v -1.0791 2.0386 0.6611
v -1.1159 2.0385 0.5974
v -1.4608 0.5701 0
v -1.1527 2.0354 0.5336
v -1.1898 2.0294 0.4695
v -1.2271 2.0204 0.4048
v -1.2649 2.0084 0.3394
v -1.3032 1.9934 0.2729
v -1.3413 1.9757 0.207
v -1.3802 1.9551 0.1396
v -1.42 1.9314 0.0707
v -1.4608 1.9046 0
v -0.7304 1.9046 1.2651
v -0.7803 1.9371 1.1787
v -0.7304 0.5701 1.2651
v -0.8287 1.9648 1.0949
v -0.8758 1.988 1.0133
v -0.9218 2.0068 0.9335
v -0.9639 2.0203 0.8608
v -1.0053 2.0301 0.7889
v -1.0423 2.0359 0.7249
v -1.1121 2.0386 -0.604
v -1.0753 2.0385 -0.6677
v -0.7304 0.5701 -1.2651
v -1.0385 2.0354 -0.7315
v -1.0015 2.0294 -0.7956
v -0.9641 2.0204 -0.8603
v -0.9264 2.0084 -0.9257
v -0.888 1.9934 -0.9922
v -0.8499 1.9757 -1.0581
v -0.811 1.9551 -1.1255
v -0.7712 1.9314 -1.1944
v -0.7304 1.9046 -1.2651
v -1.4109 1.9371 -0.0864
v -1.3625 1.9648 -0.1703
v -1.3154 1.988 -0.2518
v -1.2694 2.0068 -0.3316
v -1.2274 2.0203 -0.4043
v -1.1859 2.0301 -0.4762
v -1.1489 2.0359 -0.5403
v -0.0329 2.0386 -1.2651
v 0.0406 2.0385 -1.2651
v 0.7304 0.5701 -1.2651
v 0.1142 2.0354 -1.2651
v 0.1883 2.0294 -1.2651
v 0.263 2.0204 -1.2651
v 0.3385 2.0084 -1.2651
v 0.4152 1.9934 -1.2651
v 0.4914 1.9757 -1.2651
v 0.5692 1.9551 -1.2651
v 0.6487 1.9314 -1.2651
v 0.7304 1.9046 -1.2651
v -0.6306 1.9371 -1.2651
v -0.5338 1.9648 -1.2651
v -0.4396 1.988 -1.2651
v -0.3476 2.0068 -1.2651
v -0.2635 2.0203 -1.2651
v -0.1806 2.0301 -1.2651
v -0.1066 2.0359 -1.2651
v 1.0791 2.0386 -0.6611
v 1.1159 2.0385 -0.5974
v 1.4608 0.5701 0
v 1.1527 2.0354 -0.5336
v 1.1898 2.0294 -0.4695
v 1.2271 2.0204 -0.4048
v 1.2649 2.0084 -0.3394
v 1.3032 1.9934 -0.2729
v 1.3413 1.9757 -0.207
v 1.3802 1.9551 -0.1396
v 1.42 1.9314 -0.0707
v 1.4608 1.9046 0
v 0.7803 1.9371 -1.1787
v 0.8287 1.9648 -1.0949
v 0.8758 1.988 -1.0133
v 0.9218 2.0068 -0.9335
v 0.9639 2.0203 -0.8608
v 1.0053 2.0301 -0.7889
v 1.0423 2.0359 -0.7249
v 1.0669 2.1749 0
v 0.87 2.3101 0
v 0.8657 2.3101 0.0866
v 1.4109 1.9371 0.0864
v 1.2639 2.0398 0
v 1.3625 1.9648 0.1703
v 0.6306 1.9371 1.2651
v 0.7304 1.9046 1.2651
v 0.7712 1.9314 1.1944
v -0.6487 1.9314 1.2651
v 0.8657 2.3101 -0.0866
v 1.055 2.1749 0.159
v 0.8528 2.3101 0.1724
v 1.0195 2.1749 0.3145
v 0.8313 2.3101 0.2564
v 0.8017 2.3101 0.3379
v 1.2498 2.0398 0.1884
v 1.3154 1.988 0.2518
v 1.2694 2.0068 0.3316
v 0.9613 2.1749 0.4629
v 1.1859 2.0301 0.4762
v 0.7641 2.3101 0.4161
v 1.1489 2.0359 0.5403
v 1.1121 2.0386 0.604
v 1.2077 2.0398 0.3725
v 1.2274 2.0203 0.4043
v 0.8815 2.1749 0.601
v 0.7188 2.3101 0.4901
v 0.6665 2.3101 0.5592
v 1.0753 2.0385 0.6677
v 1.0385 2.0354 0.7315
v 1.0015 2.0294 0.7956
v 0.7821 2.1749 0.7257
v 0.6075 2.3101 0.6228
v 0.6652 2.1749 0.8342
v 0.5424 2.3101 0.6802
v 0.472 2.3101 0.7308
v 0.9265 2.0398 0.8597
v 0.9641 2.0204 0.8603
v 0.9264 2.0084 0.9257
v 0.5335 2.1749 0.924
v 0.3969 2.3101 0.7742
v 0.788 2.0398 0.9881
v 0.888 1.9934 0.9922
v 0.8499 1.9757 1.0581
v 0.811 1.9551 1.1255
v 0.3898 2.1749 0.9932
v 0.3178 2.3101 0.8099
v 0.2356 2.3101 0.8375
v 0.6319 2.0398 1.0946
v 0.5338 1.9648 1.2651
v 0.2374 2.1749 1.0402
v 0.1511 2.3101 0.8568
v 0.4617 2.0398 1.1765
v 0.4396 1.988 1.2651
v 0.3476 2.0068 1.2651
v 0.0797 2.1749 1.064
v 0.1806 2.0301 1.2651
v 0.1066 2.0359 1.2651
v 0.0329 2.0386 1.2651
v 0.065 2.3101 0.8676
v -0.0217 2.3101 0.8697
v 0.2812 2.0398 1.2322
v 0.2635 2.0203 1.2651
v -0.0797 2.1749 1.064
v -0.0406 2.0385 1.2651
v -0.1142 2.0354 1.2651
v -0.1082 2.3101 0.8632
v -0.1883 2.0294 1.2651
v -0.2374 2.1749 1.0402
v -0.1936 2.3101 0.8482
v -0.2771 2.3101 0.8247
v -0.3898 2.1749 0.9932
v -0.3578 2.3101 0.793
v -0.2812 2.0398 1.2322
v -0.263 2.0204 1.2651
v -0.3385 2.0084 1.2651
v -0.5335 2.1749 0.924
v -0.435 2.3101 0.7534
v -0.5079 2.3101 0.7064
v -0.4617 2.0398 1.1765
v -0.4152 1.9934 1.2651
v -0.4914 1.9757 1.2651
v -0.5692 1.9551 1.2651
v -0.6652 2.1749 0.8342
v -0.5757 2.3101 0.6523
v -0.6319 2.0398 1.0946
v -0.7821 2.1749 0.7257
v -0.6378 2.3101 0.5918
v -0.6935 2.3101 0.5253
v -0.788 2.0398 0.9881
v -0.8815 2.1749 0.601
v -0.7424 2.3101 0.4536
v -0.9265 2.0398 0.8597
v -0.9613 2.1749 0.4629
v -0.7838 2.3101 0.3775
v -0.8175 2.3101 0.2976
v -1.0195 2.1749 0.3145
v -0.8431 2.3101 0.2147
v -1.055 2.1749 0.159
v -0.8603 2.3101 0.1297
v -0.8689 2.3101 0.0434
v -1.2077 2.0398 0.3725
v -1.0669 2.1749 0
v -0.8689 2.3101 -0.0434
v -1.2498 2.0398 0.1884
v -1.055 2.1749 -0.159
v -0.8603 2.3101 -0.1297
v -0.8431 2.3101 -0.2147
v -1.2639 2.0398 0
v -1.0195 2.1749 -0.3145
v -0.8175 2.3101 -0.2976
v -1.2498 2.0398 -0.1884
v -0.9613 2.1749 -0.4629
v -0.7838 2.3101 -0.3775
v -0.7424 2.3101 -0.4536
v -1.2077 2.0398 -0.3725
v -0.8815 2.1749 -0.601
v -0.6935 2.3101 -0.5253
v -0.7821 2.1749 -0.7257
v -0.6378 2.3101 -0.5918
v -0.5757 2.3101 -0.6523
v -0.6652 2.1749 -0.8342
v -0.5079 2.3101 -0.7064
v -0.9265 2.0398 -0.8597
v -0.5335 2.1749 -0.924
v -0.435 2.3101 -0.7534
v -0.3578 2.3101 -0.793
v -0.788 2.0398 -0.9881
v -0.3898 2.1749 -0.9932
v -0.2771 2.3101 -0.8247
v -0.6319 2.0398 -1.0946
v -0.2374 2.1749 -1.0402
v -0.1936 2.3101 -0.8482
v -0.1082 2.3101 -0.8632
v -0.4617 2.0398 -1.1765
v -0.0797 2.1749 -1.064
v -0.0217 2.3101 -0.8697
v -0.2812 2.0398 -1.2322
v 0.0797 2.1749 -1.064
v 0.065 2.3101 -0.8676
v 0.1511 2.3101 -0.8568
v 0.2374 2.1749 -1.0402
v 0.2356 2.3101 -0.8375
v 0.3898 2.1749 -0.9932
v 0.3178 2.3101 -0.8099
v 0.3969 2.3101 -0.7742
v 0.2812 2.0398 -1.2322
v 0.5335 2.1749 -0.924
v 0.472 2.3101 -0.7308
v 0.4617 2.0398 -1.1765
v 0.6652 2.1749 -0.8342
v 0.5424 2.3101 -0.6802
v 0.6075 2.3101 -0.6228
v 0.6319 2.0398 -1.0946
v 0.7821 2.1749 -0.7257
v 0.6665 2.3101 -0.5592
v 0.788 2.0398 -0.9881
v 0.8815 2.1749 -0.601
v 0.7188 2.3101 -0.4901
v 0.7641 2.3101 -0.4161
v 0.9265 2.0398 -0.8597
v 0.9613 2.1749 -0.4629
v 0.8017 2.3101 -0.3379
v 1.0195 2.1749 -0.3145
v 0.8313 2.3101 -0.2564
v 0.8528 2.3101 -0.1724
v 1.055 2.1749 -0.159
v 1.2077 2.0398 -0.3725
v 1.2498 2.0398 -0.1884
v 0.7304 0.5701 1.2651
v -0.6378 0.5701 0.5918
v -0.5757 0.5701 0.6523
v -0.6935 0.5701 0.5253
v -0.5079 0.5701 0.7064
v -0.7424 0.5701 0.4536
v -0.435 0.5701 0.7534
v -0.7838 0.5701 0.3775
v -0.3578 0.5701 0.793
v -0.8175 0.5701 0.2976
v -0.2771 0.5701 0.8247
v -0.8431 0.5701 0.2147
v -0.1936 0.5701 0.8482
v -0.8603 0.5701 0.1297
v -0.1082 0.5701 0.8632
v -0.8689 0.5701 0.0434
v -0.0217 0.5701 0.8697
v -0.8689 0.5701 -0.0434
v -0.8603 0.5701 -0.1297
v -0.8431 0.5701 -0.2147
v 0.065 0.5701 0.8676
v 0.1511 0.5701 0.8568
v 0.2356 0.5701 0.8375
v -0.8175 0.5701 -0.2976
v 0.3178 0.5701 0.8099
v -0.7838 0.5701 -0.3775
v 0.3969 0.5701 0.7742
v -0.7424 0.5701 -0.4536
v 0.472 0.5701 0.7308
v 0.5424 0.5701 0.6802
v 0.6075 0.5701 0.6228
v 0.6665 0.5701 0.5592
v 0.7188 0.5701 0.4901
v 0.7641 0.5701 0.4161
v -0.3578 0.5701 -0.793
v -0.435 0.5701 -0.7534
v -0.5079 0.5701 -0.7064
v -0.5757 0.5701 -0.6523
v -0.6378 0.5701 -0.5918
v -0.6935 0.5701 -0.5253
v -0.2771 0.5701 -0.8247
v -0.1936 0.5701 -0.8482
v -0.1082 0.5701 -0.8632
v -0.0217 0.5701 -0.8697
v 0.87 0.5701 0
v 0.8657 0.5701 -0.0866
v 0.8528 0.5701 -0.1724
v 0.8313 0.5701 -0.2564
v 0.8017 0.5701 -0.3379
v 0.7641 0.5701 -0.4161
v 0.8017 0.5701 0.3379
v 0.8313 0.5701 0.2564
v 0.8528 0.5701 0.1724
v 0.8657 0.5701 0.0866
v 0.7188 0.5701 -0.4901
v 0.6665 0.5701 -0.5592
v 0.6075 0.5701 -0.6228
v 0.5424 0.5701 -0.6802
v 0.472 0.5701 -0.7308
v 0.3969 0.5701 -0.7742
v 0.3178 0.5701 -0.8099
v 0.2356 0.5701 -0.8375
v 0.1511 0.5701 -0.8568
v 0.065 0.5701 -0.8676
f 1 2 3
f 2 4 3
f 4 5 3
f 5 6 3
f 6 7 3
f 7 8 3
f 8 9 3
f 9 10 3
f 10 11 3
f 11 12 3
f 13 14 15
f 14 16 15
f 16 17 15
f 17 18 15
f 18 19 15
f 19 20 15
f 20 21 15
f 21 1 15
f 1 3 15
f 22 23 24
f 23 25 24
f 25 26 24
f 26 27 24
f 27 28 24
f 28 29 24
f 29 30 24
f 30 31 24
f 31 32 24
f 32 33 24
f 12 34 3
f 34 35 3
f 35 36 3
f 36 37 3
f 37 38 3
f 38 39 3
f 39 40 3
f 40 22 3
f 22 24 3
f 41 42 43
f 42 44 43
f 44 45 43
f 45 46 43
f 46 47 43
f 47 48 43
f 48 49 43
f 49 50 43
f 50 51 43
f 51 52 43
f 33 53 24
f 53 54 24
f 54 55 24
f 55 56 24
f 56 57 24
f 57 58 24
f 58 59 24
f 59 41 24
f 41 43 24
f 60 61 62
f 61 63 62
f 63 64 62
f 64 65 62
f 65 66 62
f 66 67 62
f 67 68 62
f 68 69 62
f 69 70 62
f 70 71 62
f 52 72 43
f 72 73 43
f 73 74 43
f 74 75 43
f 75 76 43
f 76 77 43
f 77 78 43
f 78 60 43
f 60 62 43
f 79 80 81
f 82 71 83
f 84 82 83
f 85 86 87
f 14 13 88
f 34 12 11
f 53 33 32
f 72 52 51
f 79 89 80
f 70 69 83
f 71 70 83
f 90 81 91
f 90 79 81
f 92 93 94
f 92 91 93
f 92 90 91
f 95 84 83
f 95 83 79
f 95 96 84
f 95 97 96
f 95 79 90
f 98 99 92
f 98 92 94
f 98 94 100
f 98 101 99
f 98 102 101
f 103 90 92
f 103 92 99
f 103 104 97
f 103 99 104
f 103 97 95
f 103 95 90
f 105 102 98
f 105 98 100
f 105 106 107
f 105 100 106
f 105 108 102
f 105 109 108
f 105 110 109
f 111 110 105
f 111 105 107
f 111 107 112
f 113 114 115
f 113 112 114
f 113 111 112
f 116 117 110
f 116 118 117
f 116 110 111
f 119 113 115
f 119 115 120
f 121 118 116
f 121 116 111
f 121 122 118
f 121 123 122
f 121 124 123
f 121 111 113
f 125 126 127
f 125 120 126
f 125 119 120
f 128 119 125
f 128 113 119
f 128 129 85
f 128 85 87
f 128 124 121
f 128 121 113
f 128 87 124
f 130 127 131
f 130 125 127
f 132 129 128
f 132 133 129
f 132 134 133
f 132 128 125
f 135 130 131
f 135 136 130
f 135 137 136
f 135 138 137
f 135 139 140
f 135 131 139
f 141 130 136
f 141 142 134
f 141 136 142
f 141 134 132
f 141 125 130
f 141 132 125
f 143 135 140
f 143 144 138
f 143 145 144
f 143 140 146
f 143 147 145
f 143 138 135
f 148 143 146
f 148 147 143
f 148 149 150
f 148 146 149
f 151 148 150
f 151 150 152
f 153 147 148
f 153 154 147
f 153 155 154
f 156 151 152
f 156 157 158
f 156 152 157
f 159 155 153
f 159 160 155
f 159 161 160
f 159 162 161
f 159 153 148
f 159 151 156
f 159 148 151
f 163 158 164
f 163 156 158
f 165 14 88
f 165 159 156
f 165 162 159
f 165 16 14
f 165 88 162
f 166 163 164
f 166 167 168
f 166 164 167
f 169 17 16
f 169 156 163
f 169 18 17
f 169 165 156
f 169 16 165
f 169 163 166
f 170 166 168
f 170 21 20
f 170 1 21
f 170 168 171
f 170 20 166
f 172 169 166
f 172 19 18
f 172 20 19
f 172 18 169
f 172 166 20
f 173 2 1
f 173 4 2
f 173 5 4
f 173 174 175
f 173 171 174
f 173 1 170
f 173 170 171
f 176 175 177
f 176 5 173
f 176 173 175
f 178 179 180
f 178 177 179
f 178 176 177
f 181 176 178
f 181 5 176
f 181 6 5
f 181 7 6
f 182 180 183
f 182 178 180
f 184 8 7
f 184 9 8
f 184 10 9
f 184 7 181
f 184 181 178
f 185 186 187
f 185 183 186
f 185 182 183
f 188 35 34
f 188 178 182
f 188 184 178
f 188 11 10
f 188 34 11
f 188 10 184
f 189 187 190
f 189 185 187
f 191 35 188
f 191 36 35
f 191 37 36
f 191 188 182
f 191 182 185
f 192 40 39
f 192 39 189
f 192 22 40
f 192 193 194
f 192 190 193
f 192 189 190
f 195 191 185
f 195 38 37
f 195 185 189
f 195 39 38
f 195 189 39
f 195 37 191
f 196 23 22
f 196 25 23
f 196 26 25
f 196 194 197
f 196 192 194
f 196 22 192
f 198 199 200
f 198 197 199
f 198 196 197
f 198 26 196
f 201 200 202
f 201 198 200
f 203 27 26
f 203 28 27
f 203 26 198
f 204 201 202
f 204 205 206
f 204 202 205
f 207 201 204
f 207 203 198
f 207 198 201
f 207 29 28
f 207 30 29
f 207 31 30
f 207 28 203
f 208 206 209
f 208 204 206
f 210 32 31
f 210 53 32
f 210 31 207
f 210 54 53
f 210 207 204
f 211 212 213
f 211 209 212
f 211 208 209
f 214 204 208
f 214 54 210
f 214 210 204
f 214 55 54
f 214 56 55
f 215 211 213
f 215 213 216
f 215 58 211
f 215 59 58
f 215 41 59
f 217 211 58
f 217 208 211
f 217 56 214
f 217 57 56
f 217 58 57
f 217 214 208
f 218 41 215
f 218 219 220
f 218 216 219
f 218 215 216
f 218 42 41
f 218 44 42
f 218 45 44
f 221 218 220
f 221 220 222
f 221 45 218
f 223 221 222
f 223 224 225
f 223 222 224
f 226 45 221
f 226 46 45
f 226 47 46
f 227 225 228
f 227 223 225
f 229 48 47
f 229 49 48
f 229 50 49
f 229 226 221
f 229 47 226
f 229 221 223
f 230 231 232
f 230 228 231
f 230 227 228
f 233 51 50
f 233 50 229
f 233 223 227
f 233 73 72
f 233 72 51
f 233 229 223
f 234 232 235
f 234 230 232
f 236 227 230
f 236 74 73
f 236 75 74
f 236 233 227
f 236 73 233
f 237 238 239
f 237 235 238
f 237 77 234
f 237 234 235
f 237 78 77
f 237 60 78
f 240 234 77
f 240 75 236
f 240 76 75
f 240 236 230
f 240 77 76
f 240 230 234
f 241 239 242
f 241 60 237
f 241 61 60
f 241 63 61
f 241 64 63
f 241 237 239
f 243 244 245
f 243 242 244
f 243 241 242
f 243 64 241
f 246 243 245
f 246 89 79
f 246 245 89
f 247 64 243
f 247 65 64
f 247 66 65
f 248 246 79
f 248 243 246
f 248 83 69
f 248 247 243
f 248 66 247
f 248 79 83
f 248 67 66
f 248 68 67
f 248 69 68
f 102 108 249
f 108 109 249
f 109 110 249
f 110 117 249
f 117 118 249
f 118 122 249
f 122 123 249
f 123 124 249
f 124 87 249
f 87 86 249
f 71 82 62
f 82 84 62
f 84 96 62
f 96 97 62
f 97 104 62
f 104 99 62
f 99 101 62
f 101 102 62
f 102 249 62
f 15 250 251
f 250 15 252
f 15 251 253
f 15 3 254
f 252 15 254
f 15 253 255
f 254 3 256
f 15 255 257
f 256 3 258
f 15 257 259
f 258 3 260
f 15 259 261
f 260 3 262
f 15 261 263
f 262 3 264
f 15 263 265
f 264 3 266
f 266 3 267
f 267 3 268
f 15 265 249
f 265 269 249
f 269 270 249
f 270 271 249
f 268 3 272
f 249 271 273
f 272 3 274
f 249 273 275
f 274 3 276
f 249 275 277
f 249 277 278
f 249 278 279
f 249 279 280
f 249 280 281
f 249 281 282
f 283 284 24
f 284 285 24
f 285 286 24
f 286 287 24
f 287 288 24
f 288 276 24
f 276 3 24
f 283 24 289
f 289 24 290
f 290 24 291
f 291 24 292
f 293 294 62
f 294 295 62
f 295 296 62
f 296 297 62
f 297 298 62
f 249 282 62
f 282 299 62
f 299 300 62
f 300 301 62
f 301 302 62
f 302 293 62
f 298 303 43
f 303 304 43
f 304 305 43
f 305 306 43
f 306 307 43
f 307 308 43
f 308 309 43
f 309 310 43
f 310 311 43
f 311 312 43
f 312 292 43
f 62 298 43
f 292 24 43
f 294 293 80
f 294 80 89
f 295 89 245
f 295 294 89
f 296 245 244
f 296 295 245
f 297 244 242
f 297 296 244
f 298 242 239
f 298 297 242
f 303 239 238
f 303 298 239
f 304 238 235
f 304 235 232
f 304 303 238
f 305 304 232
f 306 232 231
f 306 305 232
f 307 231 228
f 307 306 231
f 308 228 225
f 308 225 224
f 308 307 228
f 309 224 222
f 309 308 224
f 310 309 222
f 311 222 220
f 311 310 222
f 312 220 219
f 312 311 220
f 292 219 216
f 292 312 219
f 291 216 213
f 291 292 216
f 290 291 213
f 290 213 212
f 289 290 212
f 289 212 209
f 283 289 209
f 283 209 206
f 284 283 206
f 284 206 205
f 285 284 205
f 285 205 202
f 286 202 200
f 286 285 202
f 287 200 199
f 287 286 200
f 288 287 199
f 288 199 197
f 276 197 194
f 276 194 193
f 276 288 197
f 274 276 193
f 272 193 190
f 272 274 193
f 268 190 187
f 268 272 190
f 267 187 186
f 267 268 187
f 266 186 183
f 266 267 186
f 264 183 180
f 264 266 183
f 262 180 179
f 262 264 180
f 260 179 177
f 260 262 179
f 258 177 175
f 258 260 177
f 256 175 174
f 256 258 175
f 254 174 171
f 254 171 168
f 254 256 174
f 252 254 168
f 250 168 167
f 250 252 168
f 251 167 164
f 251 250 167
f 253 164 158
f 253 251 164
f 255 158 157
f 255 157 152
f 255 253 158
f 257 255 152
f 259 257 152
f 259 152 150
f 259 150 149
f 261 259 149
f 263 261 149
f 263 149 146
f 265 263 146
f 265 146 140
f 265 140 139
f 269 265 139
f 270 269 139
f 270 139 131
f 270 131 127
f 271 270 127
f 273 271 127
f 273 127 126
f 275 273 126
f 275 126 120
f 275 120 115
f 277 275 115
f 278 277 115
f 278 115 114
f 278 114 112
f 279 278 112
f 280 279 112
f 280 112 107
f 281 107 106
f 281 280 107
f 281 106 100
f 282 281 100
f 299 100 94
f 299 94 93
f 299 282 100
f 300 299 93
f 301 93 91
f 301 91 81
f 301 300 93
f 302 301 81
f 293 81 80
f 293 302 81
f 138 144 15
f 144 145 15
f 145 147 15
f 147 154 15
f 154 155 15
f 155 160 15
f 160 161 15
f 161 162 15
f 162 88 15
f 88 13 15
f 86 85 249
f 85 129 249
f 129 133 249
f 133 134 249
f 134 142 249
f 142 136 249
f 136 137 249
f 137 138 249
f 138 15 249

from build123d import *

# Parameters (mm, degrees)
SKETCH_1_R      = 1.5
EXTRUDE_1_DEPTH = 3
SCALE_1_SCALE   = 0.58


with BuildPart() as part:
    # 草图1 → 凸台-拉伸1 (new body)
    with BuildSketch(Plane(origin=(0, 0, 0), x_dir=(1, 0, 0), z_dir=(0, 1, 0))):
        Polygon((2.51866206, 0), (1.25933103, 2.181225328), (-1.25933103, 2.181225328), (-2.51866206, 0), (-1.25933103, -2.181225328), (1.25933103, -2.181225328), align=None)
        Circle(SKETCH_1_R, mode=Mode.SUBTRACT)
    extrude(amount=EXTRUDE_1_DEPTH)

    # 草图2 → 切除-旋转1 (revolve, cut)
    with BuildSketch(Plane.XY):
        Polygon((1.5, 3), (2.51866206, 2.300955063), (2.51866206, 3), align=None)
    revolve(axis=Axis((0, 3.302801136, 0), (0, -1, 0)), mode=Mode.SUBTRACT)


with BuildPart() as part_1:
    # 缩放比例1: scaled about (0, 1.357333829, 0)
    add(part.part.scale(SCALE_1_SCALE).moved(Location((0, 0.570080208, 0))))


solid = part_1.part
